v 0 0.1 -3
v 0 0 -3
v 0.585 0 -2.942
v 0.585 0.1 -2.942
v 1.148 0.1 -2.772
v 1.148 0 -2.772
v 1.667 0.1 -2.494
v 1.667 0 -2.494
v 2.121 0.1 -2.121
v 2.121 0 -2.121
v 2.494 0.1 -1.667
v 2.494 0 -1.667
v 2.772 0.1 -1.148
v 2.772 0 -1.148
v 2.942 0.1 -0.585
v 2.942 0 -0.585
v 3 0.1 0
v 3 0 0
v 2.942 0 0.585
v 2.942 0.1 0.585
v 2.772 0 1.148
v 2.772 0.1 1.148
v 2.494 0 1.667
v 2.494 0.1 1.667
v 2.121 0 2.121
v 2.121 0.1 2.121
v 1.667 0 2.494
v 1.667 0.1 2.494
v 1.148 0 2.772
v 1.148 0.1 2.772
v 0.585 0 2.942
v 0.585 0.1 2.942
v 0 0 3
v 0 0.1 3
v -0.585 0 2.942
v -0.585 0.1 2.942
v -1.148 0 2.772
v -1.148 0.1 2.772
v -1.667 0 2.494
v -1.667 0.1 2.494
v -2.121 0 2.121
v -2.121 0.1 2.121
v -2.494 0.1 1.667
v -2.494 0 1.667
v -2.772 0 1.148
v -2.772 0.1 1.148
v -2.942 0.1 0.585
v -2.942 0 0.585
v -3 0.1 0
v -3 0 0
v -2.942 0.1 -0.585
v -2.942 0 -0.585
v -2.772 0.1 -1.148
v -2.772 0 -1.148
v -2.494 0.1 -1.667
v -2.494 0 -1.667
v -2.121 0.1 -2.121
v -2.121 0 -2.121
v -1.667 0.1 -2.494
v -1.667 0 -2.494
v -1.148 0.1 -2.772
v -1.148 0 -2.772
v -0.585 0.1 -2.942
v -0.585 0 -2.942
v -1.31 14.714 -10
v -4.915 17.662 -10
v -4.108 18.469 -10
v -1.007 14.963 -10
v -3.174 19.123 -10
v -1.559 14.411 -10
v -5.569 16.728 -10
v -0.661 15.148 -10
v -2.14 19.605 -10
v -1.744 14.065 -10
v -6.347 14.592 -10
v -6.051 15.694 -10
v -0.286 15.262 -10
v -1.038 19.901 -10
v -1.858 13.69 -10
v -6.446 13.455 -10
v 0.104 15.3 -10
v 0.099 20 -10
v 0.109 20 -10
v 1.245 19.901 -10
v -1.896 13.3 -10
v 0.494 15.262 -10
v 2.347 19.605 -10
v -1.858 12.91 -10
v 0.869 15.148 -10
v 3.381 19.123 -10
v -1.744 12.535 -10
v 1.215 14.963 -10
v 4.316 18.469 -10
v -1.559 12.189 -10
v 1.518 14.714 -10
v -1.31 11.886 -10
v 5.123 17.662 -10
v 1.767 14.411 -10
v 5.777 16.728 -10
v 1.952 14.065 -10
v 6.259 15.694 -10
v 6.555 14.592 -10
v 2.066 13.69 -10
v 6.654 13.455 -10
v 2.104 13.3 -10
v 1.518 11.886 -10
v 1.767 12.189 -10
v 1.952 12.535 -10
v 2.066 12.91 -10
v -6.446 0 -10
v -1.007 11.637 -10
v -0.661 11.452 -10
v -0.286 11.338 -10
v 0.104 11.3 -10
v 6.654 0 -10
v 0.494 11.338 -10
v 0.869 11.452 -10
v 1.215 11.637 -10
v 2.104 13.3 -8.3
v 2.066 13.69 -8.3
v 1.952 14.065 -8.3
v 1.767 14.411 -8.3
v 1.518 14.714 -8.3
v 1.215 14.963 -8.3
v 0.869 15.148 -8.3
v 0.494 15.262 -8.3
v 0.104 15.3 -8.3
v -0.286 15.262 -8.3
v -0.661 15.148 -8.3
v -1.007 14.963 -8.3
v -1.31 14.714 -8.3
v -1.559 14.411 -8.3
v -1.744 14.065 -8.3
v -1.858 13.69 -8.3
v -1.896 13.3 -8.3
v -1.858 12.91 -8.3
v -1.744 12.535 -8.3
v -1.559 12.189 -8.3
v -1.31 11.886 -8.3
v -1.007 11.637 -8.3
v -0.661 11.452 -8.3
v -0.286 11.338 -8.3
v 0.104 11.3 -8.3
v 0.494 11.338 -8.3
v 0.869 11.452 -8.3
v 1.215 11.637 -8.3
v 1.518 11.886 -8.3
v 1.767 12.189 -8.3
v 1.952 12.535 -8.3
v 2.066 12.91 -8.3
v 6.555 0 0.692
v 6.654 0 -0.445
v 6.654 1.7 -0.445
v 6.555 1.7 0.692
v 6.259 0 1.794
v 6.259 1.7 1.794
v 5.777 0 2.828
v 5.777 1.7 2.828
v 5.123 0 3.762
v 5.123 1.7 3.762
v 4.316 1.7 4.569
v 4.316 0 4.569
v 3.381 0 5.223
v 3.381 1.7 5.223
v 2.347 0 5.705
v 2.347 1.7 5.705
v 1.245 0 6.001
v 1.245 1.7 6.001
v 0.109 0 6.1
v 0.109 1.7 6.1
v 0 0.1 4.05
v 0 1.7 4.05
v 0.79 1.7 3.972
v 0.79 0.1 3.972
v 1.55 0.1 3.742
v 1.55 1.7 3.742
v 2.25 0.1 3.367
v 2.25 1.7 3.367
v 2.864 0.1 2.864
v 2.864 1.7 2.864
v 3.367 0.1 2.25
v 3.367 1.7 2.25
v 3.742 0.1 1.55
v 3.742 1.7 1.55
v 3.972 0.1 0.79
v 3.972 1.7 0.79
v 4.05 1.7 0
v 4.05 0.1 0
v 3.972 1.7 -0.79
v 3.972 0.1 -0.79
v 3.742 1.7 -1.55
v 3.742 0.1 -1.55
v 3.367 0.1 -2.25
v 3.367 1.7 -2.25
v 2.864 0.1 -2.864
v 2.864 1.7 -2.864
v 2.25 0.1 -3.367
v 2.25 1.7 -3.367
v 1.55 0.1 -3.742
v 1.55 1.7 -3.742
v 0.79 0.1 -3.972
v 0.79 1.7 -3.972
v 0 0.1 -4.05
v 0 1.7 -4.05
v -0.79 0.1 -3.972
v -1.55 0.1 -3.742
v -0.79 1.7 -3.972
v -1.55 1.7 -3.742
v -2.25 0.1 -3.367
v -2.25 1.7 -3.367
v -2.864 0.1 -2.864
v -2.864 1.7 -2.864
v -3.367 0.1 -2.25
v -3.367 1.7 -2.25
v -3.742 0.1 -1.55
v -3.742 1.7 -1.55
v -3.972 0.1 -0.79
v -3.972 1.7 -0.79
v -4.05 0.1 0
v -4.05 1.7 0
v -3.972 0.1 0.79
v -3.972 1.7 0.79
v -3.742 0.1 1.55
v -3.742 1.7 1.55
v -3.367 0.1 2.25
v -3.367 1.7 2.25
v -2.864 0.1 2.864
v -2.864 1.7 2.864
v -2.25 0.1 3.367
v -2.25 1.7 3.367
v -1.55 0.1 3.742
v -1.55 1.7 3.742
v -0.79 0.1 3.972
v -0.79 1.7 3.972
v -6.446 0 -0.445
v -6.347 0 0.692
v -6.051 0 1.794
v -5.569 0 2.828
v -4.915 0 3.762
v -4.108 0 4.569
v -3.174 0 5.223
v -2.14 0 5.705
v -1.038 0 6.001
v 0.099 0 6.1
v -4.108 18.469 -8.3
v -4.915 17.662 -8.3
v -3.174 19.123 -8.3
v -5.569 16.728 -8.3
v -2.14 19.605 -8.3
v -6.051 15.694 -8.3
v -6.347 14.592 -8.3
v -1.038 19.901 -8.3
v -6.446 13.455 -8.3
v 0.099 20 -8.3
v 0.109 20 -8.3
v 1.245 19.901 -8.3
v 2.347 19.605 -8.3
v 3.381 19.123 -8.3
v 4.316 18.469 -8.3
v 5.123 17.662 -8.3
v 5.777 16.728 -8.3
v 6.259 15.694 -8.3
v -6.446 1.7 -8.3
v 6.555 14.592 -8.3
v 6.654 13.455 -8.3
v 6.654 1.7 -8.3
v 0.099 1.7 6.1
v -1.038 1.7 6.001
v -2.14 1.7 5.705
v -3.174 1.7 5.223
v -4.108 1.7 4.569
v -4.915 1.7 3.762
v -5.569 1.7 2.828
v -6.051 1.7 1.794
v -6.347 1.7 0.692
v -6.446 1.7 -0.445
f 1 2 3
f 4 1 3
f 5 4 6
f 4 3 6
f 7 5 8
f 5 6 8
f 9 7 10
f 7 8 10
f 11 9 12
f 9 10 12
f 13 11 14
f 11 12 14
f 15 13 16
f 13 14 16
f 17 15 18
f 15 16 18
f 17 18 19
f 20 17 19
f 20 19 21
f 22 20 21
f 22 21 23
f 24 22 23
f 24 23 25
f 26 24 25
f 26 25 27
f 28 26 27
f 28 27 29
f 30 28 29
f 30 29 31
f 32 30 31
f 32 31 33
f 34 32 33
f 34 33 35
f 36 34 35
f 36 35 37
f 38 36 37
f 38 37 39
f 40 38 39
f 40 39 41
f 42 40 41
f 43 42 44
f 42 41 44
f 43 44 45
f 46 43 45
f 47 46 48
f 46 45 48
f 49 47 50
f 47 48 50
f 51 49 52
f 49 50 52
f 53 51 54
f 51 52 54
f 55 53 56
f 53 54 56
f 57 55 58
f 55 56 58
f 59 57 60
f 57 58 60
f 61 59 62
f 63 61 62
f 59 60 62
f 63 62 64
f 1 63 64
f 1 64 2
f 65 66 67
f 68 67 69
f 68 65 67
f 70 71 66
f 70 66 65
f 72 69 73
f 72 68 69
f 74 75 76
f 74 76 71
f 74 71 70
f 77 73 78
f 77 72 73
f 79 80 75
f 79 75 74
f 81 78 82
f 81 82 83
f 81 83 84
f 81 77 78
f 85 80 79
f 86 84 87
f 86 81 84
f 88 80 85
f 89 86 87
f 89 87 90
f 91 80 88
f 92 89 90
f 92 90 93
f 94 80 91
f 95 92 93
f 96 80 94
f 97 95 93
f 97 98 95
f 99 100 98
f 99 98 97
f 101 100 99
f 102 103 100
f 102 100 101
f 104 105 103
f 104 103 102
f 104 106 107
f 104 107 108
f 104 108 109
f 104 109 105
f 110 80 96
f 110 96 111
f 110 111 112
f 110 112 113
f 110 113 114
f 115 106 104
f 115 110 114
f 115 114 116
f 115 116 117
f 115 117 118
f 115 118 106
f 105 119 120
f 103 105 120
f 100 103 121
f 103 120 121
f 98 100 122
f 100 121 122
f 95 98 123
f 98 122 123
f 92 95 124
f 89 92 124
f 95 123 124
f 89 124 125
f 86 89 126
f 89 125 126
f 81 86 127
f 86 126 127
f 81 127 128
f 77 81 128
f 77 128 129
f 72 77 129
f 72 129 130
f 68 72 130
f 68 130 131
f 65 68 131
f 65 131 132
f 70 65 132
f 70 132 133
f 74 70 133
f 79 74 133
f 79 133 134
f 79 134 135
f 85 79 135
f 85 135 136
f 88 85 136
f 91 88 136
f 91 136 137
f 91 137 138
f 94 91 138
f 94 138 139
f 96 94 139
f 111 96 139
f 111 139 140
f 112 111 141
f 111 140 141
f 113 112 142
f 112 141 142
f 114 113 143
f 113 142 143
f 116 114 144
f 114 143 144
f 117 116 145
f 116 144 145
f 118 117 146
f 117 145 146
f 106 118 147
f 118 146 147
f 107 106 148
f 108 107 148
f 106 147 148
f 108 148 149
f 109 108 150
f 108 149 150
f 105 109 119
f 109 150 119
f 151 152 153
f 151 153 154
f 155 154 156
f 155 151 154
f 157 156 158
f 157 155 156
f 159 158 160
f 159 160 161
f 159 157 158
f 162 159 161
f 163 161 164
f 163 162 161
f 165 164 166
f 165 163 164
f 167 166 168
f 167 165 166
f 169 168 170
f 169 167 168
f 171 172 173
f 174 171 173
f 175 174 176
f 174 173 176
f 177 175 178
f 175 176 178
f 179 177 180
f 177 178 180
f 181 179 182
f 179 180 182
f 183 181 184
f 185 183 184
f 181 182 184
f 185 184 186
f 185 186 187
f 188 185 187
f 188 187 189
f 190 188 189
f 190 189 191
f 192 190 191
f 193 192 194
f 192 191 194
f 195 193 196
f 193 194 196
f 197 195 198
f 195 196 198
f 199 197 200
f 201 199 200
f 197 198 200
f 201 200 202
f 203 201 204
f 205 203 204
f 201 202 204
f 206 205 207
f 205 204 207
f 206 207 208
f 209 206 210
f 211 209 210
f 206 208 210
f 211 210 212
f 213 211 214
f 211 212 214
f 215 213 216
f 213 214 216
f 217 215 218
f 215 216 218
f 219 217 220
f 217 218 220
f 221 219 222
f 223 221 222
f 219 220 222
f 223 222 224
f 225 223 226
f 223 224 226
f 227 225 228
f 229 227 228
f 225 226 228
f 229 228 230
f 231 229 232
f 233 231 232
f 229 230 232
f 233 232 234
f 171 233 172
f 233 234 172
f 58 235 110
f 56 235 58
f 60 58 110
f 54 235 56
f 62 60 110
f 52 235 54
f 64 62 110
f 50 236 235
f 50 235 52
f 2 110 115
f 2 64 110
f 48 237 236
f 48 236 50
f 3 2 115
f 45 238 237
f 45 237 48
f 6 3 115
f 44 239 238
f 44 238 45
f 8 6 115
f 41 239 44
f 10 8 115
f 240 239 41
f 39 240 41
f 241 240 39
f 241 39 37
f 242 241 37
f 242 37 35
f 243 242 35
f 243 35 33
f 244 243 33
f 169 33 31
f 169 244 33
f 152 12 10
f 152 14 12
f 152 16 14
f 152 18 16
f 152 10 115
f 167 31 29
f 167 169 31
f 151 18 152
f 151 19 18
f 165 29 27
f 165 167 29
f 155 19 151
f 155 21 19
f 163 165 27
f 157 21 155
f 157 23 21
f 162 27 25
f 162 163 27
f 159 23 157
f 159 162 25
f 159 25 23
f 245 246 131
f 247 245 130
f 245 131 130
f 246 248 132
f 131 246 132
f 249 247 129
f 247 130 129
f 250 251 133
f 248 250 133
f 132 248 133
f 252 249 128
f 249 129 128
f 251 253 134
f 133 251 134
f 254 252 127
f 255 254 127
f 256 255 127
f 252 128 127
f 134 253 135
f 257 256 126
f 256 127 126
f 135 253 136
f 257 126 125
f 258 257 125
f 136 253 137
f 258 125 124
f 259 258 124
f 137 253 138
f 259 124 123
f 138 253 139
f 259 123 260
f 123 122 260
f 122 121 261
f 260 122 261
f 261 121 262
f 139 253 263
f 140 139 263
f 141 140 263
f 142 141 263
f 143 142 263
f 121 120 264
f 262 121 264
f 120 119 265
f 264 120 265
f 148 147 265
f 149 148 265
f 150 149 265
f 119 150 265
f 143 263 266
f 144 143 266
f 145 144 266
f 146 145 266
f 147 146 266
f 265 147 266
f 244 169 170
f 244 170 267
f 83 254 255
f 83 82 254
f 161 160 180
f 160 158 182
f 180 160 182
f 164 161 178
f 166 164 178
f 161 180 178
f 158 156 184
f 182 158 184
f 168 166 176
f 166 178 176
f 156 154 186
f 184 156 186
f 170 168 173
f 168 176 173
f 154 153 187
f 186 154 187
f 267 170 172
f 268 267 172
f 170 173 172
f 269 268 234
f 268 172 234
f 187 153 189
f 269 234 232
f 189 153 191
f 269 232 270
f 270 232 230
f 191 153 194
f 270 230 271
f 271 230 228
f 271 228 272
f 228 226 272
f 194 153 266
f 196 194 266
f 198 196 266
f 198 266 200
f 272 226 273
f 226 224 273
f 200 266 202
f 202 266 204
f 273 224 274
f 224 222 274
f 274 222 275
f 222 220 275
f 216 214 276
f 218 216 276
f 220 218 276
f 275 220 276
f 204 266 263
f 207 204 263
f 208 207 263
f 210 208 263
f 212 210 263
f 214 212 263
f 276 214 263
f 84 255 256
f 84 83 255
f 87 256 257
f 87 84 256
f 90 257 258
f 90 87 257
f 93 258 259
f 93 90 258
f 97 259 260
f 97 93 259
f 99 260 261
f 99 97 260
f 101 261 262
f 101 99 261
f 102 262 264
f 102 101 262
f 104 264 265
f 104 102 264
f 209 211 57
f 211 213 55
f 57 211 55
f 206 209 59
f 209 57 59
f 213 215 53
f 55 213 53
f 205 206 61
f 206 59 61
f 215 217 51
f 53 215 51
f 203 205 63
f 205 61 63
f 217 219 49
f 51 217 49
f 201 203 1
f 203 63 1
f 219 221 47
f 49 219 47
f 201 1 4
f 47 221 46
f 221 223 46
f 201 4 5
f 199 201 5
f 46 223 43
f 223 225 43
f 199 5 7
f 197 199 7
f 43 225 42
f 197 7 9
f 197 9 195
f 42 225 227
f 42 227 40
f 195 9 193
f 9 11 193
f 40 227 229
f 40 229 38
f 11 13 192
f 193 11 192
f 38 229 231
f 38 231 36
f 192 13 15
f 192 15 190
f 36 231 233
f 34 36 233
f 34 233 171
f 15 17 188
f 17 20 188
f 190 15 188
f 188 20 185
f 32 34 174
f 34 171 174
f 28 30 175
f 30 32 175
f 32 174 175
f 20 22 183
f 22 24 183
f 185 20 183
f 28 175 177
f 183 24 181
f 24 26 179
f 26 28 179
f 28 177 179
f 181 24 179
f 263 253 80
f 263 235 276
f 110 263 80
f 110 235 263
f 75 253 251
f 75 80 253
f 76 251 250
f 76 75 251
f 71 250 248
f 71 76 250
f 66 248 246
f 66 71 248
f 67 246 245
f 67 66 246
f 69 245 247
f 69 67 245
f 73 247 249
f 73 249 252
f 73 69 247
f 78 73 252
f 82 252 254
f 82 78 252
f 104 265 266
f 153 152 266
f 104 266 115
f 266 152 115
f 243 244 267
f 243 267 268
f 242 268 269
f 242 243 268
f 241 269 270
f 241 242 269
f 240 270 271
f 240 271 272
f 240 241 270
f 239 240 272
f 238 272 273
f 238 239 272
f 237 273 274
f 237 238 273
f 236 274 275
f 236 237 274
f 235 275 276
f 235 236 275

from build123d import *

# Parameters (mm, degrees)
SKETCH2_R           = 2.5
BOSS_EXTRUDE1_DEPTH = 1.7
SKETCH3_W           = 13.1
SKETCH3_H           = 1.7
BOSS_EXTRUDE2_DEPTH = 18.3
SKETCH4_R           = 2
CUT_EXTRUDE1_DEPTH  = 18.3
FILLET1_R           = 6.545
SKETCH5_R           = 4.05
CUT_EXTRUDE2_DEPTH  = 1.6
SKETCH7_R           = 2.5
SKETCH7_R_2         = 1.5
BOSS_EXTRUDE4_DEPTH = 0.1
SKETCH9_R           = 3
SKETCH9_R_2         = 1.5
CUT_EXTRUDE3_DEPTH  = 2


with BuildPart() as part:
    # Sketch2 → Boss-Extrude1 (new body)
    with BuildSketch(Plane(origin=(0, 0, 0), x_dir=(1, 0, 0), z_dir=(0, 1, 0))):
        with BuildLine():
            Line((-6.446031746, 10), (6.653968254, 10))
            Line((6.653968254, 10), (6.653968254, 0.445))
            ThreePointArc((6.653968254, 0.445), (4.736982137, -4.183013883), (0.108968254, -6.1))
            Line((0.108968254, -6.1), (0.098968254, -6.1))
            ThreePointArc((0.098968254, -6.1), (-4.529045629, -4.183013883), (-6.446031746, 0.445))
            Line((-6.446031746, 0.445), (-6.446031746, 10))
        make_face()
        with Locations(Location((0, 0, 0), (0, 0, 270))):
            Circle(SKETCH2_R, mode=Mode.SUBTRACT)
    extrude(amount=BOSS_EXTRUDE1_DEPTH)

    # Sketch3 → Boss-Extrude2 (add)
    with BuildSketch(Plane(origin=(0, 1.7, 0), x_dir=(1, 0, 0), z_dir=(0, 1, 0))):
        with Locations((0.103968254, 9.15)):
            Rectangle(SKETCH3_W, SKETCH3_H)
    extrude(amount=BOSS_EXTRUDE2_DEPTH)

    # Sketch4 → Cut-Extrude1 (cut)
    with BuildSketch(Plane.XY.offset(-8.3)):
        with Locations((0.103968254, 13.3)):
            Circle(SKETCH4_R)
    extrude(amount=-CUT_EXTRUDE1_DEPTH, mode=Mode.SUBTRACT)

    # Fillet1
    fillet1_edges = [part.edges().sort_by_distance(p)[0] for p in [
        (-6.446031746, 20, -9.15),
        (6.653968254, 20, -9.15),
    ]]
    fillet(fillet1_edges, radius=FILLET1_R)

    # Sketch5 → Cut-Extrude2 (cut)
    with BuildSketch(Plane(origin=(0, 1.7, 0), x_dir=(1, 0, 0), z_dir=(0, 1, 0))):
        with Locations(Location((0, 0, 0), (0, 0, 270))):
            Circle(SKETCH5_R)
    extrude(amount=-CUT_EXTRUDE2_DEPTH, mode=Mode.SUBTRACT)

    # Sketch7 → Boss-Extrude4 (add)
    with BuildSketch(Plane.XZ):
        Circle(SKETCH7_R)
        with Locations(Location((0, 0, 0), (0, 0, 270))):
            Circle(SKETCH7_R_2, mode=Mode.SUBTRACT)
    extrude(amount=-BOSS_EXTRUDE4_DEPTH)

    # Sketch9 → Cut-Extrude3 (cut)
    with BuildSketch(Plane.XZ):
        with Locations(Location((0, 0, 0), (0, 0, 270))):
            Circle(SKETCH9_R)
        Circle(SKETCH9_R_2, mode=Mode.SUBTRACT)
    extrude(amount=-CUT_EXTRUDE3_DEPTH, mode=Mode.SUBTRACT)


solid = part.part
